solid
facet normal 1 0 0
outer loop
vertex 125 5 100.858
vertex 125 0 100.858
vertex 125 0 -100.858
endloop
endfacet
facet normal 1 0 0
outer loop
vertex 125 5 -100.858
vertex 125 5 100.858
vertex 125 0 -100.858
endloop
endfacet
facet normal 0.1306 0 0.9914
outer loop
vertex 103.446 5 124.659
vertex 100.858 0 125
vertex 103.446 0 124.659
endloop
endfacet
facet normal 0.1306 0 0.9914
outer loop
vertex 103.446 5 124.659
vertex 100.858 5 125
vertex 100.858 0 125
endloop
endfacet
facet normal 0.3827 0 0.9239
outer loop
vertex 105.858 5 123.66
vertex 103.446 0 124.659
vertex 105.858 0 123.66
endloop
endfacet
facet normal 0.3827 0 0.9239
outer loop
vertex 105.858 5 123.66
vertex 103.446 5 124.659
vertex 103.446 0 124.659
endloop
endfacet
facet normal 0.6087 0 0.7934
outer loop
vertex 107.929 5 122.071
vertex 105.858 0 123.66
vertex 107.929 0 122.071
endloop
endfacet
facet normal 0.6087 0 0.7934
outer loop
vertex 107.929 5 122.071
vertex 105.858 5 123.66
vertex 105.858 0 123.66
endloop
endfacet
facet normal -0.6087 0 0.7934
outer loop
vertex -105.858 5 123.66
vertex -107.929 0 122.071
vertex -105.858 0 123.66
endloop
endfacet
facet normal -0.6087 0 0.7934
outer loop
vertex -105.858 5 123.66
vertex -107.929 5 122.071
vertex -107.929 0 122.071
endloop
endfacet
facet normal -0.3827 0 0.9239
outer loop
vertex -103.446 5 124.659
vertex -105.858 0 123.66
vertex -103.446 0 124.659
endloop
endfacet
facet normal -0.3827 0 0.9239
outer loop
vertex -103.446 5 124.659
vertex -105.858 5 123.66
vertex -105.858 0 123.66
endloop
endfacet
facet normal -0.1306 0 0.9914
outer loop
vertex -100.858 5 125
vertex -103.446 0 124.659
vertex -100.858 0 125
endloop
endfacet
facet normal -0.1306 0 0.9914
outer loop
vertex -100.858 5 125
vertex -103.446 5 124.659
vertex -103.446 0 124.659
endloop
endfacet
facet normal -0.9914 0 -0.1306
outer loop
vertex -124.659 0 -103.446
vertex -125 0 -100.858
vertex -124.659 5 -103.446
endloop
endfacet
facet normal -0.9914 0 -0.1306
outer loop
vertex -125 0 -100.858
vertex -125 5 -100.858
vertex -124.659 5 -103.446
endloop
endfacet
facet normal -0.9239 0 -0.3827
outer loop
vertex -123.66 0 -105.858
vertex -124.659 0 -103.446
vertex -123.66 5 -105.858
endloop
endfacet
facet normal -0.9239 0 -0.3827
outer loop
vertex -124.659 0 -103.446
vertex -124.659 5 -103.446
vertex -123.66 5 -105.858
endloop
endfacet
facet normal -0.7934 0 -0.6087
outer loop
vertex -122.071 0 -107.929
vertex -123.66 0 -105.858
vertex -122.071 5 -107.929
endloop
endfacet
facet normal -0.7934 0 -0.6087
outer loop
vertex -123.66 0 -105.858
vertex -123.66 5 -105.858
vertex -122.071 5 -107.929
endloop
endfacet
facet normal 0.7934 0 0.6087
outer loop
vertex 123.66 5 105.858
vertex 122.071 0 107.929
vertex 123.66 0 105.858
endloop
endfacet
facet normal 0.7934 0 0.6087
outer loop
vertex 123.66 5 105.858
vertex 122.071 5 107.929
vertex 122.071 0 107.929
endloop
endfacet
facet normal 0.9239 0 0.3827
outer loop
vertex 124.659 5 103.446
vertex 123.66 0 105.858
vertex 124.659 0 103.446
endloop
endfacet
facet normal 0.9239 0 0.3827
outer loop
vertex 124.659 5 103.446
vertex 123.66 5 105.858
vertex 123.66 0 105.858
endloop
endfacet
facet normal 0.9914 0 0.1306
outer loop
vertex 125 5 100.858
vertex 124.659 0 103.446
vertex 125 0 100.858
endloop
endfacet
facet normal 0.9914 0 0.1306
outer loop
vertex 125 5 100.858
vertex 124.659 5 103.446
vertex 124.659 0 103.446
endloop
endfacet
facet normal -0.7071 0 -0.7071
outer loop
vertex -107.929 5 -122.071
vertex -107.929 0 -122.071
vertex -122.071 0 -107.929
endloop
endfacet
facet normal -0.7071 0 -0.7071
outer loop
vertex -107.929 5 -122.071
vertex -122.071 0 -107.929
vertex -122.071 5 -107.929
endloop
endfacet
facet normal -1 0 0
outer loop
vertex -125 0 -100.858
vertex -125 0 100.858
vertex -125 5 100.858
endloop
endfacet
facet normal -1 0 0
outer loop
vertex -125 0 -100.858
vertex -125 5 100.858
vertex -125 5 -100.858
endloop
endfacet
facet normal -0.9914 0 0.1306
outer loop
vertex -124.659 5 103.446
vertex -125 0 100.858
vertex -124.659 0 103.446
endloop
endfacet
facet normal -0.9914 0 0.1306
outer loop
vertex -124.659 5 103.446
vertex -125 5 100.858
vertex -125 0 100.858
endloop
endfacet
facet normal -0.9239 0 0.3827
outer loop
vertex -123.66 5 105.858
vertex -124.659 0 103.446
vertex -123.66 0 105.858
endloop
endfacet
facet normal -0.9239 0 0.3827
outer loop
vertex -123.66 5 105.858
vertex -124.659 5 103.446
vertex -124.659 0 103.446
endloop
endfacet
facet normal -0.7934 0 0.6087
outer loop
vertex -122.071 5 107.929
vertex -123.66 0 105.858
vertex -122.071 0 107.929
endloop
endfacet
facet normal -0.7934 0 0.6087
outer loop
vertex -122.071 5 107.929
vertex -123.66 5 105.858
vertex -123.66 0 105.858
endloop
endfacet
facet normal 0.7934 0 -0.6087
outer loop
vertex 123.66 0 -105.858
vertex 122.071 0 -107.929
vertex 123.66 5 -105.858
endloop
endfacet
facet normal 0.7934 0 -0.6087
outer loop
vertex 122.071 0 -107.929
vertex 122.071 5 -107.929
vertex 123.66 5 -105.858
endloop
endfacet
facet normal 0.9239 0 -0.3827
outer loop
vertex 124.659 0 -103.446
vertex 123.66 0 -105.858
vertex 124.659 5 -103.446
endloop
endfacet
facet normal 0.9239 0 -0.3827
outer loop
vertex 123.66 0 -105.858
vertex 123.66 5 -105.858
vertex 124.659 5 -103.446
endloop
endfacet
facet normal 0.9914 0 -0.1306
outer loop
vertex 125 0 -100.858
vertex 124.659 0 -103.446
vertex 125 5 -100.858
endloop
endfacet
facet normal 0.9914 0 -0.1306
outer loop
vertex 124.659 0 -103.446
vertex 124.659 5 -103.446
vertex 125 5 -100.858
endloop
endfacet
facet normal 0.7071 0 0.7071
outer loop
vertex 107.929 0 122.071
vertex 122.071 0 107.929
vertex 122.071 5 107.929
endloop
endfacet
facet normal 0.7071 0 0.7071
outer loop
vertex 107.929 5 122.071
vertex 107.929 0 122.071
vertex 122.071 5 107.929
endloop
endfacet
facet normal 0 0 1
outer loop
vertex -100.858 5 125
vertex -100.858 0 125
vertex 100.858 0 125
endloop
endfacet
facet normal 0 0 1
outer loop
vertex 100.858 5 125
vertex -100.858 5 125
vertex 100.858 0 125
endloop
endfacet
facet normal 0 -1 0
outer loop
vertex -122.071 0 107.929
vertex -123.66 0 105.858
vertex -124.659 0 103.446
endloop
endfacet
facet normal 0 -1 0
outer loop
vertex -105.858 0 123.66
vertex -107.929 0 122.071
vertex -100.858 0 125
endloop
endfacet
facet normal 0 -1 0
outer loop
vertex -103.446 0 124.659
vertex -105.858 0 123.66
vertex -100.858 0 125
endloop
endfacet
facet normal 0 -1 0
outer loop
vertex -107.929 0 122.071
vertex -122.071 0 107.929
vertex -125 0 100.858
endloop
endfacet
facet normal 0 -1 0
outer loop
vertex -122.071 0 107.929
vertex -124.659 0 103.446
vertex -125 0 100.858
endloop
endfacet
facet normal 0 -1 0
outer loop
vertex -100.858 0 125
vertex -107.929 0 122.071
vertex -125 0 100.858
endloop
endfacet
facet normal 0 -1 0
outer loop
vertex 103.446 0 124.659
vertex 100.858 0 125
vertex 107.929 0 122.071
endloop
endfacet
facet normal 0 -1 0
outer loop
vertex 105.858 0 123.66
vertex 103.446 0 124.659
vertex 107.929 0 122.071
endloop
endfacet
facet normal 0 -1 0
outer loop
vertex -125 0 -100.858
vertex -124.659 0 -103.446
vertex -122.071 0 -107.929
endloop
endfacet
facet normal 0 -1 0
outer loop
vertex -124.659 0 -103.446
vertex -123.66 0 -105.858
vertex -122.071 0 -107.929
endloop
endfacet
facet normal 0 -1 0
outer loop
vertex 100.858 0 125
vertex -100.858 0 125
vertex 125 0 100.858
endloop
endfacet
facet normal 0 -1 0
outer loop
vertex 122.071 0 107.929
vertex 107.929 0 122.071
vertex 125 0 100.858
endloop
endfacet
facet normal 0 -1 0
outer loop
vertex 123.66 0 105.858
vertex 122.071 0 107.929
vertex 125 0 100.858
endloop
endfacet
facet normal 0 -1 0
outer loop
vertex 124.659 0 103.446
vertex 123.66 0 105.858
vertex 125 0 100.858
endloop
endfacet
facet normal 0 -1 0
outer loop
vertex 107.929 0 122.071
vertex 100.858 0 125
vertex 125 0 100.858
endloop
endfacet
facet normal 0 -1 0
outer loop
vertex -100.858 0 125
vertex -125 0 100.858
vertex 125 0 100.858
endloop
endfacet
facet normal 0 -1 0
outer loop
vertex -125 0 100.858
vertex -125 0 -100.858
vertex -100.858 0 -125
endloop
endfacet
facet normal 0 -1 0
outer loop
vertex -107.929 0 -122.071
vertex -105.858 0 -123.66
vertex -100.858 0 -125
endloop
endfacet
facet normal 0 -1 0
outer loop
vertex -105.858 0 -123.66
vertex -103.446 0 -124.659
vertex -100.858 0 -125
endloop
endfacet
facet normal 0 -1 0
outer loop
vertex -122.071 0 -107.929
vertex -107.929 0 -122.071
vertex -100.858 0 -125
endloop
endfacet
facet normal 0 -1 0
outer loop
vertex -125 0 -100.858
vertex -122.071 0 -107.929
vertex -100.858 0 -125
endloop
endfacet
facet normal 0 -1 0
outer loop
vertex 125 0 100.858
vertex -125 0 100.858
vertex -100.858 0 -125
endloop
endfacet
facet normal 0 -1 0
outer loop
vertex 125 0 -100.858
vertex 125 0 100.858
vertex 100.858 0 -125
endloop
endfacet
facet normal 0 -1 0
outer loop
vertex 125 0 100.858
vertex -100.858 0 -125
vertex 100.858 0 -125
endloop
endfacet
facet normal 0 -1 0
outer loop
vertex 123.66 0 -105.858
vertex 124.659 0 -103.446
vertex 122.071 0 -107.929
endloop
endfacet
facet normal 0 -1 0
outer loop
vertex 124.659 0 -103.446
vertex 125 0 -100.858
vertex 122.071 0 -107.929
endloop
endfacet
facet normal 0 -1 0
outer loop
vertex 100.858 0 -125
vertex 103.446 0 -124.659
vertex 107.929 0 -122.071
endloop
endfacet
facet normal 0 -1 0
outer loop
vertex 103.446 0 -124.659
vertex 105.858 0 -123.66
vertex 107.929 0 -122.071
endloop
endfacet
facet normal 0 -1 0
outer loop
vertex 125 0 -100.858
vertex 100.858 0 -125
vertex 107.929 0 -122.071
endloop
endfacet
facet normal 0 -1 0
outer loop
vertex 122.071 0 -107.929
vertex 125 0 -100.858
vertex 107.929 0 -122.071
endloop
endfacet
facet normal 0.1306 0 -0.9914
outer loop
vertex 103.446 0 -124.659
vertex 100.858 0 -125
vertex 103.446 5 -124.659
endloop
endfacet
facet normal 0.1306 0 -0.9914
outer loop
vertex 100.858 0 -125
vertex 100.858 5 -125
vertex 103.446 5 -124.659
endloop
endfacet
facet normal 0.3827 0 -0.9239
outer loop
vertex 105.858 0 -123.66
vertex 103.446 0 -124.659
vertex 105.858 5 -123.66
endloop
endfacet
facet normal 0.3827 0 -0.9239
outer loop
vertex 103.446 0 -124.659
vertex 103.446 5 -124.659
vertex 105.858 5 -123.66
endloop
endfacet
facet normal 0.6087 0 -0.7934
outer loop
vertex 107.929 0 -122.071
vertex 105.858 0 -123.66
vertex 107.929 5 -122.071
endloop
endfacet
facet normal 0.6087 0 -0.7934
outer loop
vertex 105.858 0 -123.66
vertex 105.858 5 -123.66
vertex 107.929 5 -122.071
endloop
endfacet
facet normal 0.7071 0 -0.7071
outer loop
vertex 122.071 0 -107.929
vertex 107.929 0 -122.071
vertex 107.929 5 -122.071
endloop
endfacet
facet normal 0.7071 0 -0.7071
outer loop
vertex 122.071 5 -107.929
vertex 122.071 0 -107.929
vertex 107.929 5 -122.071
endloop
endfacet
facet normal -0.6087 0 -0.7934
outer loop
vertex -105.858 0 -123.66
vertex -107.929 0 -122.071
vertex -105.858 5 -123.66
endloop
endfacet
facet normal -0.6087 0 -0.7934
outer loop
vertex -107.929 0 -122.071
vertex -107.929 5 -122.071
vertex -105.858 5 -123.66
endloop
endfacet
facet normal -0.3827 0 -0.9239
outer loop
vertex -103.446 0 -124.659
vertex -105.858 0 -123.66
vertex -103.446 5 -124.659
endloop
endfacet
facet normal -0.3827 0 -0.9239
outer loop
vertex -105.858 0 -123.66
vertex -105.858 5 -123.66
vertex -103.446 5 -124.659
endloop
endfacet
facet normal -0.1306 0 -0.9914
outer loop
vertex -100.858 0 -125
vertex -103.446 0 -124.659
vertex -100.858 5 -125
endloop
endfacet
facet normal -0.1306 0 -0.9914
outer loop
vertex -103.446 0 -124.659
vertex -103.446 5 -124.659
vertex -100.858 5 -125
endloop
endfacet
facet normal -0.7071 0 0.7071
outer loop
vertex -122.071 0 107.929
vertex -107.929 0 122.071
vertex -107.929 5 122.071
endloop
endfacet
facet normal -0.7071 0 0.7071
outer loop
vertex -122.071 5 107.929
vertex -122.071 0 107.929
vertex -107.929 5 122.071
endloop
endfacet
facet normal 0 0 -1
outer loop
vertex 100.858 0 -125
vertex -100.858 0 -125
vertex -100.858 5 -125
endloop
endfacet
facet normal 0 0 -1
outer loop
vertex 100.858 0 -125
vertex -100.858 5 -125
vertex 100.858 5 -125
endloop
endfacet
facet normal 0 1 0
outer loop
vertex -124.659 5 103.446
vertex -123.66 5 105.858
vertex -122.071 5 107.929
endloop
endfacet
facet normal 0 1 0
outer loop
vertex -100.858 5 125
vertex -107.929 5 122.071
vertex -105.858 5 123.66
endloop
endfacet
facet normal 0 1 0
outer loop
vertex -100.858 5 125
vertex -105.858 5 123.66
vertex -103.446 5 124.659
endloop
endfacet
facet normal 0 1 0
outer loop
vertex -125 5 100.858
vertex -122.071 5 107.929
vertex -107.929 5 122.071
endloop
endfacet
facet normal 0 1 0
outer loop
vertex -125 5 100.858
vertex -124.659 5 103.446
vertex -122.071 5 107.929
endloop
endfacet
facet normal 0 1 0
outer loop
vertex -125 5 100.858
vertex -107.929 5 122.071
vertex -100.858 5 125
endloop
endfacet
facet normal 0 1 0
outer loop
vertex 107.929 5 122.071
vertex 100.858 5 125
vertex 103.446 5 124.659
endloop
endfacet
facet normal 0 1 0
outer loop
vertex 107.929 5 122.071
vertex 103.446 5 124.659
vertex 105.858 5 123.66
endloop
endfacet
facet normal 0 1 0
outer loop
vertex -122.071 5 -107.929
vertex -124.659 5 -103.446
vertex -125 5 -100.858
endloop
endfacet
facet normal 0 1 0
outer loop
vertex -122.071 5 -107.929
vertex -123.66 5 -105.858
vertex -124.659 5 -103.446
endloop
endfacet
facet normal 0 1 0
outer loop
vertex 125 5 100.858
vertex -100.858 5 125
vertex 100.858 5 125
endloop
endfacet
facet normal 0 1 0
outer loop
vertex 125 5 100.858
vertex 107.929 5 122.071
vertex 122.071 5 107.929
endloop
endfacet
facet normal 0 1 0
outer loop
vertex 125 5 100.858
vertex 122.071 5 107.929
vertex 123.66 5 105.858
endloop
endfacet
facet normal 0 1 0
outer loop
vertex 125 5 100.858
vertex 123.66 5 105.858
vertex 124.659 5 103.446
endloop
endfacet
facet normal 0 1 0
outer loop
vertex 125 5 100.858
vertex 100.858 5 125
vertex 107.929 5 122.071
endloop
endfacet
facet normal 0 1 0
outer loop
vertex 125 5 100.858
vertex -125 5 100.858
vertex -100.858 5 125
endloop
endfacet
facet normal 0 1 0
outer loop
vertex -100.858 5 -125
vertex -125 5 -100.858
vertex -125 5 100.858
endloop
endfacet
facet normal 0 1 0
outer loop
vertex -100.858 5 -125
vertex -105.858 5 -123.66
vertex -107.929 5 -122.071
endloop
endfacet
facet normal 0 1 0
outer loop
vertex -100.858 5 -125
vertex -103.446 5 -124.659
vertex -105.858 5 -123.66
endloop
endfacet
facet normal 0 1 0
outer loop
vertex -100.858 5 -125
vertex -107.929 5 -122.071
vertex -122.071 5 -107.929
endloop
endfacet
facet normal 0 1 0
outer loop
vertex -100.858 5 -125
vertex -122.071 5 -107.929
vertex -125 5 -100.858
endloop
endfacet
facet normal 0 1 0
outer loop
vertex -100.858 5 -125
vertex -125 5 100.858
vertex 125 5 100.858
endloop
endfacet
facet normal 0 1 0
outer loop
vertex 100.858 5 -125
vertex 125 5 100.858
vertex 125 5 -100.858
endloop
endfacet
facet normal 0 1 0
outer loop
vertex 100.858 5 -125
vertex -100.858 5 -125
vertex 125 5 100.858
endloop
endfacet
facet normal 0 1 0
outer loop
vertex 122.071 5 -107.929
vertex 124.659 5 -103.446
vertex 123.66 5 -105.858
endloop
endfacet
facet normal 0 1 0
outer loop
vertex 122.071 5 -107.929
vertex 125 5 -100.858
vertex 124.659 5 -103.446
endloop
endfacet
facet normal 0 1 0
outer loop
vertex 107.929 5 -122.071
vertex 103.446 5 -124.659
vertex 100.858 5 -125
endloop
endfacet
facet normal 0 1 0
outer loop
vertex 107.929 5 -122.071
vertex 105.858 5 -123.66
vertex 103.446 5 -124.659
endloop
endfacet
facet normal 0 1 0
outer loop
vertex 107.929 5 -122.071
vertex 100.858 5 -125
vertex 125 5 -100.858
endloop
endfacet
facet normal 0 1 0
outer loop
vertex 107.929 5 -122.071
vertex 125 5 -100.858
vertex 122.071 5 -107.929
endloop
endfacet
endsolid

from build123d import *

# Parameters (mm, degrees)
SKETCH1_W           = 250
SKETCH1_H           = 250
BOSS_EXTRUDE1_DEPTH = 5
CHAMFER1_SIZE       = 20
FILLET2_R           = 10


with BuildPart() as part:
    # Sketch1 → Boss-Extrude1 (new body)
    with BuildSketch(Plane(origin=(0, 0, 0), x_dir=(1, 0, 0), z_dir=(0, 1, 0))):
        Rectangle(SKETCH1_W, SKETCH1_H)
    extrude(amount=BOSS_EXTRUDE1_DEPTH)

    # Chamfer1
    chamfer1_edges = [part.edges().sort_by_distance(p)[0] for p in [
        (125, 2.5, 125),
        (-125, 2.5, 125),
        (-125, 2.5, -125),
        (125, 2.5, -125),
    ]]
    chamfer(chamfer1_edges, length=CHAMFER1_SIZE)

    # Fillet2
    fillet2_edges = [part.edges().sort_by_distance(p)[0] for p in [
        (-105, 2.5, -125),
        (105, 2.5, -125),
        (125, 2.5, 105),
        (125, 2.5, -105),
        (-105, 2.5, 125),
        (105, 2.5, 125),
        (-125, 2.5, -105),
        (-125, 2.5, 105),
    ]]
    fillet(fillet2_edges, radius=FILLET2_R)


solid = part.part
